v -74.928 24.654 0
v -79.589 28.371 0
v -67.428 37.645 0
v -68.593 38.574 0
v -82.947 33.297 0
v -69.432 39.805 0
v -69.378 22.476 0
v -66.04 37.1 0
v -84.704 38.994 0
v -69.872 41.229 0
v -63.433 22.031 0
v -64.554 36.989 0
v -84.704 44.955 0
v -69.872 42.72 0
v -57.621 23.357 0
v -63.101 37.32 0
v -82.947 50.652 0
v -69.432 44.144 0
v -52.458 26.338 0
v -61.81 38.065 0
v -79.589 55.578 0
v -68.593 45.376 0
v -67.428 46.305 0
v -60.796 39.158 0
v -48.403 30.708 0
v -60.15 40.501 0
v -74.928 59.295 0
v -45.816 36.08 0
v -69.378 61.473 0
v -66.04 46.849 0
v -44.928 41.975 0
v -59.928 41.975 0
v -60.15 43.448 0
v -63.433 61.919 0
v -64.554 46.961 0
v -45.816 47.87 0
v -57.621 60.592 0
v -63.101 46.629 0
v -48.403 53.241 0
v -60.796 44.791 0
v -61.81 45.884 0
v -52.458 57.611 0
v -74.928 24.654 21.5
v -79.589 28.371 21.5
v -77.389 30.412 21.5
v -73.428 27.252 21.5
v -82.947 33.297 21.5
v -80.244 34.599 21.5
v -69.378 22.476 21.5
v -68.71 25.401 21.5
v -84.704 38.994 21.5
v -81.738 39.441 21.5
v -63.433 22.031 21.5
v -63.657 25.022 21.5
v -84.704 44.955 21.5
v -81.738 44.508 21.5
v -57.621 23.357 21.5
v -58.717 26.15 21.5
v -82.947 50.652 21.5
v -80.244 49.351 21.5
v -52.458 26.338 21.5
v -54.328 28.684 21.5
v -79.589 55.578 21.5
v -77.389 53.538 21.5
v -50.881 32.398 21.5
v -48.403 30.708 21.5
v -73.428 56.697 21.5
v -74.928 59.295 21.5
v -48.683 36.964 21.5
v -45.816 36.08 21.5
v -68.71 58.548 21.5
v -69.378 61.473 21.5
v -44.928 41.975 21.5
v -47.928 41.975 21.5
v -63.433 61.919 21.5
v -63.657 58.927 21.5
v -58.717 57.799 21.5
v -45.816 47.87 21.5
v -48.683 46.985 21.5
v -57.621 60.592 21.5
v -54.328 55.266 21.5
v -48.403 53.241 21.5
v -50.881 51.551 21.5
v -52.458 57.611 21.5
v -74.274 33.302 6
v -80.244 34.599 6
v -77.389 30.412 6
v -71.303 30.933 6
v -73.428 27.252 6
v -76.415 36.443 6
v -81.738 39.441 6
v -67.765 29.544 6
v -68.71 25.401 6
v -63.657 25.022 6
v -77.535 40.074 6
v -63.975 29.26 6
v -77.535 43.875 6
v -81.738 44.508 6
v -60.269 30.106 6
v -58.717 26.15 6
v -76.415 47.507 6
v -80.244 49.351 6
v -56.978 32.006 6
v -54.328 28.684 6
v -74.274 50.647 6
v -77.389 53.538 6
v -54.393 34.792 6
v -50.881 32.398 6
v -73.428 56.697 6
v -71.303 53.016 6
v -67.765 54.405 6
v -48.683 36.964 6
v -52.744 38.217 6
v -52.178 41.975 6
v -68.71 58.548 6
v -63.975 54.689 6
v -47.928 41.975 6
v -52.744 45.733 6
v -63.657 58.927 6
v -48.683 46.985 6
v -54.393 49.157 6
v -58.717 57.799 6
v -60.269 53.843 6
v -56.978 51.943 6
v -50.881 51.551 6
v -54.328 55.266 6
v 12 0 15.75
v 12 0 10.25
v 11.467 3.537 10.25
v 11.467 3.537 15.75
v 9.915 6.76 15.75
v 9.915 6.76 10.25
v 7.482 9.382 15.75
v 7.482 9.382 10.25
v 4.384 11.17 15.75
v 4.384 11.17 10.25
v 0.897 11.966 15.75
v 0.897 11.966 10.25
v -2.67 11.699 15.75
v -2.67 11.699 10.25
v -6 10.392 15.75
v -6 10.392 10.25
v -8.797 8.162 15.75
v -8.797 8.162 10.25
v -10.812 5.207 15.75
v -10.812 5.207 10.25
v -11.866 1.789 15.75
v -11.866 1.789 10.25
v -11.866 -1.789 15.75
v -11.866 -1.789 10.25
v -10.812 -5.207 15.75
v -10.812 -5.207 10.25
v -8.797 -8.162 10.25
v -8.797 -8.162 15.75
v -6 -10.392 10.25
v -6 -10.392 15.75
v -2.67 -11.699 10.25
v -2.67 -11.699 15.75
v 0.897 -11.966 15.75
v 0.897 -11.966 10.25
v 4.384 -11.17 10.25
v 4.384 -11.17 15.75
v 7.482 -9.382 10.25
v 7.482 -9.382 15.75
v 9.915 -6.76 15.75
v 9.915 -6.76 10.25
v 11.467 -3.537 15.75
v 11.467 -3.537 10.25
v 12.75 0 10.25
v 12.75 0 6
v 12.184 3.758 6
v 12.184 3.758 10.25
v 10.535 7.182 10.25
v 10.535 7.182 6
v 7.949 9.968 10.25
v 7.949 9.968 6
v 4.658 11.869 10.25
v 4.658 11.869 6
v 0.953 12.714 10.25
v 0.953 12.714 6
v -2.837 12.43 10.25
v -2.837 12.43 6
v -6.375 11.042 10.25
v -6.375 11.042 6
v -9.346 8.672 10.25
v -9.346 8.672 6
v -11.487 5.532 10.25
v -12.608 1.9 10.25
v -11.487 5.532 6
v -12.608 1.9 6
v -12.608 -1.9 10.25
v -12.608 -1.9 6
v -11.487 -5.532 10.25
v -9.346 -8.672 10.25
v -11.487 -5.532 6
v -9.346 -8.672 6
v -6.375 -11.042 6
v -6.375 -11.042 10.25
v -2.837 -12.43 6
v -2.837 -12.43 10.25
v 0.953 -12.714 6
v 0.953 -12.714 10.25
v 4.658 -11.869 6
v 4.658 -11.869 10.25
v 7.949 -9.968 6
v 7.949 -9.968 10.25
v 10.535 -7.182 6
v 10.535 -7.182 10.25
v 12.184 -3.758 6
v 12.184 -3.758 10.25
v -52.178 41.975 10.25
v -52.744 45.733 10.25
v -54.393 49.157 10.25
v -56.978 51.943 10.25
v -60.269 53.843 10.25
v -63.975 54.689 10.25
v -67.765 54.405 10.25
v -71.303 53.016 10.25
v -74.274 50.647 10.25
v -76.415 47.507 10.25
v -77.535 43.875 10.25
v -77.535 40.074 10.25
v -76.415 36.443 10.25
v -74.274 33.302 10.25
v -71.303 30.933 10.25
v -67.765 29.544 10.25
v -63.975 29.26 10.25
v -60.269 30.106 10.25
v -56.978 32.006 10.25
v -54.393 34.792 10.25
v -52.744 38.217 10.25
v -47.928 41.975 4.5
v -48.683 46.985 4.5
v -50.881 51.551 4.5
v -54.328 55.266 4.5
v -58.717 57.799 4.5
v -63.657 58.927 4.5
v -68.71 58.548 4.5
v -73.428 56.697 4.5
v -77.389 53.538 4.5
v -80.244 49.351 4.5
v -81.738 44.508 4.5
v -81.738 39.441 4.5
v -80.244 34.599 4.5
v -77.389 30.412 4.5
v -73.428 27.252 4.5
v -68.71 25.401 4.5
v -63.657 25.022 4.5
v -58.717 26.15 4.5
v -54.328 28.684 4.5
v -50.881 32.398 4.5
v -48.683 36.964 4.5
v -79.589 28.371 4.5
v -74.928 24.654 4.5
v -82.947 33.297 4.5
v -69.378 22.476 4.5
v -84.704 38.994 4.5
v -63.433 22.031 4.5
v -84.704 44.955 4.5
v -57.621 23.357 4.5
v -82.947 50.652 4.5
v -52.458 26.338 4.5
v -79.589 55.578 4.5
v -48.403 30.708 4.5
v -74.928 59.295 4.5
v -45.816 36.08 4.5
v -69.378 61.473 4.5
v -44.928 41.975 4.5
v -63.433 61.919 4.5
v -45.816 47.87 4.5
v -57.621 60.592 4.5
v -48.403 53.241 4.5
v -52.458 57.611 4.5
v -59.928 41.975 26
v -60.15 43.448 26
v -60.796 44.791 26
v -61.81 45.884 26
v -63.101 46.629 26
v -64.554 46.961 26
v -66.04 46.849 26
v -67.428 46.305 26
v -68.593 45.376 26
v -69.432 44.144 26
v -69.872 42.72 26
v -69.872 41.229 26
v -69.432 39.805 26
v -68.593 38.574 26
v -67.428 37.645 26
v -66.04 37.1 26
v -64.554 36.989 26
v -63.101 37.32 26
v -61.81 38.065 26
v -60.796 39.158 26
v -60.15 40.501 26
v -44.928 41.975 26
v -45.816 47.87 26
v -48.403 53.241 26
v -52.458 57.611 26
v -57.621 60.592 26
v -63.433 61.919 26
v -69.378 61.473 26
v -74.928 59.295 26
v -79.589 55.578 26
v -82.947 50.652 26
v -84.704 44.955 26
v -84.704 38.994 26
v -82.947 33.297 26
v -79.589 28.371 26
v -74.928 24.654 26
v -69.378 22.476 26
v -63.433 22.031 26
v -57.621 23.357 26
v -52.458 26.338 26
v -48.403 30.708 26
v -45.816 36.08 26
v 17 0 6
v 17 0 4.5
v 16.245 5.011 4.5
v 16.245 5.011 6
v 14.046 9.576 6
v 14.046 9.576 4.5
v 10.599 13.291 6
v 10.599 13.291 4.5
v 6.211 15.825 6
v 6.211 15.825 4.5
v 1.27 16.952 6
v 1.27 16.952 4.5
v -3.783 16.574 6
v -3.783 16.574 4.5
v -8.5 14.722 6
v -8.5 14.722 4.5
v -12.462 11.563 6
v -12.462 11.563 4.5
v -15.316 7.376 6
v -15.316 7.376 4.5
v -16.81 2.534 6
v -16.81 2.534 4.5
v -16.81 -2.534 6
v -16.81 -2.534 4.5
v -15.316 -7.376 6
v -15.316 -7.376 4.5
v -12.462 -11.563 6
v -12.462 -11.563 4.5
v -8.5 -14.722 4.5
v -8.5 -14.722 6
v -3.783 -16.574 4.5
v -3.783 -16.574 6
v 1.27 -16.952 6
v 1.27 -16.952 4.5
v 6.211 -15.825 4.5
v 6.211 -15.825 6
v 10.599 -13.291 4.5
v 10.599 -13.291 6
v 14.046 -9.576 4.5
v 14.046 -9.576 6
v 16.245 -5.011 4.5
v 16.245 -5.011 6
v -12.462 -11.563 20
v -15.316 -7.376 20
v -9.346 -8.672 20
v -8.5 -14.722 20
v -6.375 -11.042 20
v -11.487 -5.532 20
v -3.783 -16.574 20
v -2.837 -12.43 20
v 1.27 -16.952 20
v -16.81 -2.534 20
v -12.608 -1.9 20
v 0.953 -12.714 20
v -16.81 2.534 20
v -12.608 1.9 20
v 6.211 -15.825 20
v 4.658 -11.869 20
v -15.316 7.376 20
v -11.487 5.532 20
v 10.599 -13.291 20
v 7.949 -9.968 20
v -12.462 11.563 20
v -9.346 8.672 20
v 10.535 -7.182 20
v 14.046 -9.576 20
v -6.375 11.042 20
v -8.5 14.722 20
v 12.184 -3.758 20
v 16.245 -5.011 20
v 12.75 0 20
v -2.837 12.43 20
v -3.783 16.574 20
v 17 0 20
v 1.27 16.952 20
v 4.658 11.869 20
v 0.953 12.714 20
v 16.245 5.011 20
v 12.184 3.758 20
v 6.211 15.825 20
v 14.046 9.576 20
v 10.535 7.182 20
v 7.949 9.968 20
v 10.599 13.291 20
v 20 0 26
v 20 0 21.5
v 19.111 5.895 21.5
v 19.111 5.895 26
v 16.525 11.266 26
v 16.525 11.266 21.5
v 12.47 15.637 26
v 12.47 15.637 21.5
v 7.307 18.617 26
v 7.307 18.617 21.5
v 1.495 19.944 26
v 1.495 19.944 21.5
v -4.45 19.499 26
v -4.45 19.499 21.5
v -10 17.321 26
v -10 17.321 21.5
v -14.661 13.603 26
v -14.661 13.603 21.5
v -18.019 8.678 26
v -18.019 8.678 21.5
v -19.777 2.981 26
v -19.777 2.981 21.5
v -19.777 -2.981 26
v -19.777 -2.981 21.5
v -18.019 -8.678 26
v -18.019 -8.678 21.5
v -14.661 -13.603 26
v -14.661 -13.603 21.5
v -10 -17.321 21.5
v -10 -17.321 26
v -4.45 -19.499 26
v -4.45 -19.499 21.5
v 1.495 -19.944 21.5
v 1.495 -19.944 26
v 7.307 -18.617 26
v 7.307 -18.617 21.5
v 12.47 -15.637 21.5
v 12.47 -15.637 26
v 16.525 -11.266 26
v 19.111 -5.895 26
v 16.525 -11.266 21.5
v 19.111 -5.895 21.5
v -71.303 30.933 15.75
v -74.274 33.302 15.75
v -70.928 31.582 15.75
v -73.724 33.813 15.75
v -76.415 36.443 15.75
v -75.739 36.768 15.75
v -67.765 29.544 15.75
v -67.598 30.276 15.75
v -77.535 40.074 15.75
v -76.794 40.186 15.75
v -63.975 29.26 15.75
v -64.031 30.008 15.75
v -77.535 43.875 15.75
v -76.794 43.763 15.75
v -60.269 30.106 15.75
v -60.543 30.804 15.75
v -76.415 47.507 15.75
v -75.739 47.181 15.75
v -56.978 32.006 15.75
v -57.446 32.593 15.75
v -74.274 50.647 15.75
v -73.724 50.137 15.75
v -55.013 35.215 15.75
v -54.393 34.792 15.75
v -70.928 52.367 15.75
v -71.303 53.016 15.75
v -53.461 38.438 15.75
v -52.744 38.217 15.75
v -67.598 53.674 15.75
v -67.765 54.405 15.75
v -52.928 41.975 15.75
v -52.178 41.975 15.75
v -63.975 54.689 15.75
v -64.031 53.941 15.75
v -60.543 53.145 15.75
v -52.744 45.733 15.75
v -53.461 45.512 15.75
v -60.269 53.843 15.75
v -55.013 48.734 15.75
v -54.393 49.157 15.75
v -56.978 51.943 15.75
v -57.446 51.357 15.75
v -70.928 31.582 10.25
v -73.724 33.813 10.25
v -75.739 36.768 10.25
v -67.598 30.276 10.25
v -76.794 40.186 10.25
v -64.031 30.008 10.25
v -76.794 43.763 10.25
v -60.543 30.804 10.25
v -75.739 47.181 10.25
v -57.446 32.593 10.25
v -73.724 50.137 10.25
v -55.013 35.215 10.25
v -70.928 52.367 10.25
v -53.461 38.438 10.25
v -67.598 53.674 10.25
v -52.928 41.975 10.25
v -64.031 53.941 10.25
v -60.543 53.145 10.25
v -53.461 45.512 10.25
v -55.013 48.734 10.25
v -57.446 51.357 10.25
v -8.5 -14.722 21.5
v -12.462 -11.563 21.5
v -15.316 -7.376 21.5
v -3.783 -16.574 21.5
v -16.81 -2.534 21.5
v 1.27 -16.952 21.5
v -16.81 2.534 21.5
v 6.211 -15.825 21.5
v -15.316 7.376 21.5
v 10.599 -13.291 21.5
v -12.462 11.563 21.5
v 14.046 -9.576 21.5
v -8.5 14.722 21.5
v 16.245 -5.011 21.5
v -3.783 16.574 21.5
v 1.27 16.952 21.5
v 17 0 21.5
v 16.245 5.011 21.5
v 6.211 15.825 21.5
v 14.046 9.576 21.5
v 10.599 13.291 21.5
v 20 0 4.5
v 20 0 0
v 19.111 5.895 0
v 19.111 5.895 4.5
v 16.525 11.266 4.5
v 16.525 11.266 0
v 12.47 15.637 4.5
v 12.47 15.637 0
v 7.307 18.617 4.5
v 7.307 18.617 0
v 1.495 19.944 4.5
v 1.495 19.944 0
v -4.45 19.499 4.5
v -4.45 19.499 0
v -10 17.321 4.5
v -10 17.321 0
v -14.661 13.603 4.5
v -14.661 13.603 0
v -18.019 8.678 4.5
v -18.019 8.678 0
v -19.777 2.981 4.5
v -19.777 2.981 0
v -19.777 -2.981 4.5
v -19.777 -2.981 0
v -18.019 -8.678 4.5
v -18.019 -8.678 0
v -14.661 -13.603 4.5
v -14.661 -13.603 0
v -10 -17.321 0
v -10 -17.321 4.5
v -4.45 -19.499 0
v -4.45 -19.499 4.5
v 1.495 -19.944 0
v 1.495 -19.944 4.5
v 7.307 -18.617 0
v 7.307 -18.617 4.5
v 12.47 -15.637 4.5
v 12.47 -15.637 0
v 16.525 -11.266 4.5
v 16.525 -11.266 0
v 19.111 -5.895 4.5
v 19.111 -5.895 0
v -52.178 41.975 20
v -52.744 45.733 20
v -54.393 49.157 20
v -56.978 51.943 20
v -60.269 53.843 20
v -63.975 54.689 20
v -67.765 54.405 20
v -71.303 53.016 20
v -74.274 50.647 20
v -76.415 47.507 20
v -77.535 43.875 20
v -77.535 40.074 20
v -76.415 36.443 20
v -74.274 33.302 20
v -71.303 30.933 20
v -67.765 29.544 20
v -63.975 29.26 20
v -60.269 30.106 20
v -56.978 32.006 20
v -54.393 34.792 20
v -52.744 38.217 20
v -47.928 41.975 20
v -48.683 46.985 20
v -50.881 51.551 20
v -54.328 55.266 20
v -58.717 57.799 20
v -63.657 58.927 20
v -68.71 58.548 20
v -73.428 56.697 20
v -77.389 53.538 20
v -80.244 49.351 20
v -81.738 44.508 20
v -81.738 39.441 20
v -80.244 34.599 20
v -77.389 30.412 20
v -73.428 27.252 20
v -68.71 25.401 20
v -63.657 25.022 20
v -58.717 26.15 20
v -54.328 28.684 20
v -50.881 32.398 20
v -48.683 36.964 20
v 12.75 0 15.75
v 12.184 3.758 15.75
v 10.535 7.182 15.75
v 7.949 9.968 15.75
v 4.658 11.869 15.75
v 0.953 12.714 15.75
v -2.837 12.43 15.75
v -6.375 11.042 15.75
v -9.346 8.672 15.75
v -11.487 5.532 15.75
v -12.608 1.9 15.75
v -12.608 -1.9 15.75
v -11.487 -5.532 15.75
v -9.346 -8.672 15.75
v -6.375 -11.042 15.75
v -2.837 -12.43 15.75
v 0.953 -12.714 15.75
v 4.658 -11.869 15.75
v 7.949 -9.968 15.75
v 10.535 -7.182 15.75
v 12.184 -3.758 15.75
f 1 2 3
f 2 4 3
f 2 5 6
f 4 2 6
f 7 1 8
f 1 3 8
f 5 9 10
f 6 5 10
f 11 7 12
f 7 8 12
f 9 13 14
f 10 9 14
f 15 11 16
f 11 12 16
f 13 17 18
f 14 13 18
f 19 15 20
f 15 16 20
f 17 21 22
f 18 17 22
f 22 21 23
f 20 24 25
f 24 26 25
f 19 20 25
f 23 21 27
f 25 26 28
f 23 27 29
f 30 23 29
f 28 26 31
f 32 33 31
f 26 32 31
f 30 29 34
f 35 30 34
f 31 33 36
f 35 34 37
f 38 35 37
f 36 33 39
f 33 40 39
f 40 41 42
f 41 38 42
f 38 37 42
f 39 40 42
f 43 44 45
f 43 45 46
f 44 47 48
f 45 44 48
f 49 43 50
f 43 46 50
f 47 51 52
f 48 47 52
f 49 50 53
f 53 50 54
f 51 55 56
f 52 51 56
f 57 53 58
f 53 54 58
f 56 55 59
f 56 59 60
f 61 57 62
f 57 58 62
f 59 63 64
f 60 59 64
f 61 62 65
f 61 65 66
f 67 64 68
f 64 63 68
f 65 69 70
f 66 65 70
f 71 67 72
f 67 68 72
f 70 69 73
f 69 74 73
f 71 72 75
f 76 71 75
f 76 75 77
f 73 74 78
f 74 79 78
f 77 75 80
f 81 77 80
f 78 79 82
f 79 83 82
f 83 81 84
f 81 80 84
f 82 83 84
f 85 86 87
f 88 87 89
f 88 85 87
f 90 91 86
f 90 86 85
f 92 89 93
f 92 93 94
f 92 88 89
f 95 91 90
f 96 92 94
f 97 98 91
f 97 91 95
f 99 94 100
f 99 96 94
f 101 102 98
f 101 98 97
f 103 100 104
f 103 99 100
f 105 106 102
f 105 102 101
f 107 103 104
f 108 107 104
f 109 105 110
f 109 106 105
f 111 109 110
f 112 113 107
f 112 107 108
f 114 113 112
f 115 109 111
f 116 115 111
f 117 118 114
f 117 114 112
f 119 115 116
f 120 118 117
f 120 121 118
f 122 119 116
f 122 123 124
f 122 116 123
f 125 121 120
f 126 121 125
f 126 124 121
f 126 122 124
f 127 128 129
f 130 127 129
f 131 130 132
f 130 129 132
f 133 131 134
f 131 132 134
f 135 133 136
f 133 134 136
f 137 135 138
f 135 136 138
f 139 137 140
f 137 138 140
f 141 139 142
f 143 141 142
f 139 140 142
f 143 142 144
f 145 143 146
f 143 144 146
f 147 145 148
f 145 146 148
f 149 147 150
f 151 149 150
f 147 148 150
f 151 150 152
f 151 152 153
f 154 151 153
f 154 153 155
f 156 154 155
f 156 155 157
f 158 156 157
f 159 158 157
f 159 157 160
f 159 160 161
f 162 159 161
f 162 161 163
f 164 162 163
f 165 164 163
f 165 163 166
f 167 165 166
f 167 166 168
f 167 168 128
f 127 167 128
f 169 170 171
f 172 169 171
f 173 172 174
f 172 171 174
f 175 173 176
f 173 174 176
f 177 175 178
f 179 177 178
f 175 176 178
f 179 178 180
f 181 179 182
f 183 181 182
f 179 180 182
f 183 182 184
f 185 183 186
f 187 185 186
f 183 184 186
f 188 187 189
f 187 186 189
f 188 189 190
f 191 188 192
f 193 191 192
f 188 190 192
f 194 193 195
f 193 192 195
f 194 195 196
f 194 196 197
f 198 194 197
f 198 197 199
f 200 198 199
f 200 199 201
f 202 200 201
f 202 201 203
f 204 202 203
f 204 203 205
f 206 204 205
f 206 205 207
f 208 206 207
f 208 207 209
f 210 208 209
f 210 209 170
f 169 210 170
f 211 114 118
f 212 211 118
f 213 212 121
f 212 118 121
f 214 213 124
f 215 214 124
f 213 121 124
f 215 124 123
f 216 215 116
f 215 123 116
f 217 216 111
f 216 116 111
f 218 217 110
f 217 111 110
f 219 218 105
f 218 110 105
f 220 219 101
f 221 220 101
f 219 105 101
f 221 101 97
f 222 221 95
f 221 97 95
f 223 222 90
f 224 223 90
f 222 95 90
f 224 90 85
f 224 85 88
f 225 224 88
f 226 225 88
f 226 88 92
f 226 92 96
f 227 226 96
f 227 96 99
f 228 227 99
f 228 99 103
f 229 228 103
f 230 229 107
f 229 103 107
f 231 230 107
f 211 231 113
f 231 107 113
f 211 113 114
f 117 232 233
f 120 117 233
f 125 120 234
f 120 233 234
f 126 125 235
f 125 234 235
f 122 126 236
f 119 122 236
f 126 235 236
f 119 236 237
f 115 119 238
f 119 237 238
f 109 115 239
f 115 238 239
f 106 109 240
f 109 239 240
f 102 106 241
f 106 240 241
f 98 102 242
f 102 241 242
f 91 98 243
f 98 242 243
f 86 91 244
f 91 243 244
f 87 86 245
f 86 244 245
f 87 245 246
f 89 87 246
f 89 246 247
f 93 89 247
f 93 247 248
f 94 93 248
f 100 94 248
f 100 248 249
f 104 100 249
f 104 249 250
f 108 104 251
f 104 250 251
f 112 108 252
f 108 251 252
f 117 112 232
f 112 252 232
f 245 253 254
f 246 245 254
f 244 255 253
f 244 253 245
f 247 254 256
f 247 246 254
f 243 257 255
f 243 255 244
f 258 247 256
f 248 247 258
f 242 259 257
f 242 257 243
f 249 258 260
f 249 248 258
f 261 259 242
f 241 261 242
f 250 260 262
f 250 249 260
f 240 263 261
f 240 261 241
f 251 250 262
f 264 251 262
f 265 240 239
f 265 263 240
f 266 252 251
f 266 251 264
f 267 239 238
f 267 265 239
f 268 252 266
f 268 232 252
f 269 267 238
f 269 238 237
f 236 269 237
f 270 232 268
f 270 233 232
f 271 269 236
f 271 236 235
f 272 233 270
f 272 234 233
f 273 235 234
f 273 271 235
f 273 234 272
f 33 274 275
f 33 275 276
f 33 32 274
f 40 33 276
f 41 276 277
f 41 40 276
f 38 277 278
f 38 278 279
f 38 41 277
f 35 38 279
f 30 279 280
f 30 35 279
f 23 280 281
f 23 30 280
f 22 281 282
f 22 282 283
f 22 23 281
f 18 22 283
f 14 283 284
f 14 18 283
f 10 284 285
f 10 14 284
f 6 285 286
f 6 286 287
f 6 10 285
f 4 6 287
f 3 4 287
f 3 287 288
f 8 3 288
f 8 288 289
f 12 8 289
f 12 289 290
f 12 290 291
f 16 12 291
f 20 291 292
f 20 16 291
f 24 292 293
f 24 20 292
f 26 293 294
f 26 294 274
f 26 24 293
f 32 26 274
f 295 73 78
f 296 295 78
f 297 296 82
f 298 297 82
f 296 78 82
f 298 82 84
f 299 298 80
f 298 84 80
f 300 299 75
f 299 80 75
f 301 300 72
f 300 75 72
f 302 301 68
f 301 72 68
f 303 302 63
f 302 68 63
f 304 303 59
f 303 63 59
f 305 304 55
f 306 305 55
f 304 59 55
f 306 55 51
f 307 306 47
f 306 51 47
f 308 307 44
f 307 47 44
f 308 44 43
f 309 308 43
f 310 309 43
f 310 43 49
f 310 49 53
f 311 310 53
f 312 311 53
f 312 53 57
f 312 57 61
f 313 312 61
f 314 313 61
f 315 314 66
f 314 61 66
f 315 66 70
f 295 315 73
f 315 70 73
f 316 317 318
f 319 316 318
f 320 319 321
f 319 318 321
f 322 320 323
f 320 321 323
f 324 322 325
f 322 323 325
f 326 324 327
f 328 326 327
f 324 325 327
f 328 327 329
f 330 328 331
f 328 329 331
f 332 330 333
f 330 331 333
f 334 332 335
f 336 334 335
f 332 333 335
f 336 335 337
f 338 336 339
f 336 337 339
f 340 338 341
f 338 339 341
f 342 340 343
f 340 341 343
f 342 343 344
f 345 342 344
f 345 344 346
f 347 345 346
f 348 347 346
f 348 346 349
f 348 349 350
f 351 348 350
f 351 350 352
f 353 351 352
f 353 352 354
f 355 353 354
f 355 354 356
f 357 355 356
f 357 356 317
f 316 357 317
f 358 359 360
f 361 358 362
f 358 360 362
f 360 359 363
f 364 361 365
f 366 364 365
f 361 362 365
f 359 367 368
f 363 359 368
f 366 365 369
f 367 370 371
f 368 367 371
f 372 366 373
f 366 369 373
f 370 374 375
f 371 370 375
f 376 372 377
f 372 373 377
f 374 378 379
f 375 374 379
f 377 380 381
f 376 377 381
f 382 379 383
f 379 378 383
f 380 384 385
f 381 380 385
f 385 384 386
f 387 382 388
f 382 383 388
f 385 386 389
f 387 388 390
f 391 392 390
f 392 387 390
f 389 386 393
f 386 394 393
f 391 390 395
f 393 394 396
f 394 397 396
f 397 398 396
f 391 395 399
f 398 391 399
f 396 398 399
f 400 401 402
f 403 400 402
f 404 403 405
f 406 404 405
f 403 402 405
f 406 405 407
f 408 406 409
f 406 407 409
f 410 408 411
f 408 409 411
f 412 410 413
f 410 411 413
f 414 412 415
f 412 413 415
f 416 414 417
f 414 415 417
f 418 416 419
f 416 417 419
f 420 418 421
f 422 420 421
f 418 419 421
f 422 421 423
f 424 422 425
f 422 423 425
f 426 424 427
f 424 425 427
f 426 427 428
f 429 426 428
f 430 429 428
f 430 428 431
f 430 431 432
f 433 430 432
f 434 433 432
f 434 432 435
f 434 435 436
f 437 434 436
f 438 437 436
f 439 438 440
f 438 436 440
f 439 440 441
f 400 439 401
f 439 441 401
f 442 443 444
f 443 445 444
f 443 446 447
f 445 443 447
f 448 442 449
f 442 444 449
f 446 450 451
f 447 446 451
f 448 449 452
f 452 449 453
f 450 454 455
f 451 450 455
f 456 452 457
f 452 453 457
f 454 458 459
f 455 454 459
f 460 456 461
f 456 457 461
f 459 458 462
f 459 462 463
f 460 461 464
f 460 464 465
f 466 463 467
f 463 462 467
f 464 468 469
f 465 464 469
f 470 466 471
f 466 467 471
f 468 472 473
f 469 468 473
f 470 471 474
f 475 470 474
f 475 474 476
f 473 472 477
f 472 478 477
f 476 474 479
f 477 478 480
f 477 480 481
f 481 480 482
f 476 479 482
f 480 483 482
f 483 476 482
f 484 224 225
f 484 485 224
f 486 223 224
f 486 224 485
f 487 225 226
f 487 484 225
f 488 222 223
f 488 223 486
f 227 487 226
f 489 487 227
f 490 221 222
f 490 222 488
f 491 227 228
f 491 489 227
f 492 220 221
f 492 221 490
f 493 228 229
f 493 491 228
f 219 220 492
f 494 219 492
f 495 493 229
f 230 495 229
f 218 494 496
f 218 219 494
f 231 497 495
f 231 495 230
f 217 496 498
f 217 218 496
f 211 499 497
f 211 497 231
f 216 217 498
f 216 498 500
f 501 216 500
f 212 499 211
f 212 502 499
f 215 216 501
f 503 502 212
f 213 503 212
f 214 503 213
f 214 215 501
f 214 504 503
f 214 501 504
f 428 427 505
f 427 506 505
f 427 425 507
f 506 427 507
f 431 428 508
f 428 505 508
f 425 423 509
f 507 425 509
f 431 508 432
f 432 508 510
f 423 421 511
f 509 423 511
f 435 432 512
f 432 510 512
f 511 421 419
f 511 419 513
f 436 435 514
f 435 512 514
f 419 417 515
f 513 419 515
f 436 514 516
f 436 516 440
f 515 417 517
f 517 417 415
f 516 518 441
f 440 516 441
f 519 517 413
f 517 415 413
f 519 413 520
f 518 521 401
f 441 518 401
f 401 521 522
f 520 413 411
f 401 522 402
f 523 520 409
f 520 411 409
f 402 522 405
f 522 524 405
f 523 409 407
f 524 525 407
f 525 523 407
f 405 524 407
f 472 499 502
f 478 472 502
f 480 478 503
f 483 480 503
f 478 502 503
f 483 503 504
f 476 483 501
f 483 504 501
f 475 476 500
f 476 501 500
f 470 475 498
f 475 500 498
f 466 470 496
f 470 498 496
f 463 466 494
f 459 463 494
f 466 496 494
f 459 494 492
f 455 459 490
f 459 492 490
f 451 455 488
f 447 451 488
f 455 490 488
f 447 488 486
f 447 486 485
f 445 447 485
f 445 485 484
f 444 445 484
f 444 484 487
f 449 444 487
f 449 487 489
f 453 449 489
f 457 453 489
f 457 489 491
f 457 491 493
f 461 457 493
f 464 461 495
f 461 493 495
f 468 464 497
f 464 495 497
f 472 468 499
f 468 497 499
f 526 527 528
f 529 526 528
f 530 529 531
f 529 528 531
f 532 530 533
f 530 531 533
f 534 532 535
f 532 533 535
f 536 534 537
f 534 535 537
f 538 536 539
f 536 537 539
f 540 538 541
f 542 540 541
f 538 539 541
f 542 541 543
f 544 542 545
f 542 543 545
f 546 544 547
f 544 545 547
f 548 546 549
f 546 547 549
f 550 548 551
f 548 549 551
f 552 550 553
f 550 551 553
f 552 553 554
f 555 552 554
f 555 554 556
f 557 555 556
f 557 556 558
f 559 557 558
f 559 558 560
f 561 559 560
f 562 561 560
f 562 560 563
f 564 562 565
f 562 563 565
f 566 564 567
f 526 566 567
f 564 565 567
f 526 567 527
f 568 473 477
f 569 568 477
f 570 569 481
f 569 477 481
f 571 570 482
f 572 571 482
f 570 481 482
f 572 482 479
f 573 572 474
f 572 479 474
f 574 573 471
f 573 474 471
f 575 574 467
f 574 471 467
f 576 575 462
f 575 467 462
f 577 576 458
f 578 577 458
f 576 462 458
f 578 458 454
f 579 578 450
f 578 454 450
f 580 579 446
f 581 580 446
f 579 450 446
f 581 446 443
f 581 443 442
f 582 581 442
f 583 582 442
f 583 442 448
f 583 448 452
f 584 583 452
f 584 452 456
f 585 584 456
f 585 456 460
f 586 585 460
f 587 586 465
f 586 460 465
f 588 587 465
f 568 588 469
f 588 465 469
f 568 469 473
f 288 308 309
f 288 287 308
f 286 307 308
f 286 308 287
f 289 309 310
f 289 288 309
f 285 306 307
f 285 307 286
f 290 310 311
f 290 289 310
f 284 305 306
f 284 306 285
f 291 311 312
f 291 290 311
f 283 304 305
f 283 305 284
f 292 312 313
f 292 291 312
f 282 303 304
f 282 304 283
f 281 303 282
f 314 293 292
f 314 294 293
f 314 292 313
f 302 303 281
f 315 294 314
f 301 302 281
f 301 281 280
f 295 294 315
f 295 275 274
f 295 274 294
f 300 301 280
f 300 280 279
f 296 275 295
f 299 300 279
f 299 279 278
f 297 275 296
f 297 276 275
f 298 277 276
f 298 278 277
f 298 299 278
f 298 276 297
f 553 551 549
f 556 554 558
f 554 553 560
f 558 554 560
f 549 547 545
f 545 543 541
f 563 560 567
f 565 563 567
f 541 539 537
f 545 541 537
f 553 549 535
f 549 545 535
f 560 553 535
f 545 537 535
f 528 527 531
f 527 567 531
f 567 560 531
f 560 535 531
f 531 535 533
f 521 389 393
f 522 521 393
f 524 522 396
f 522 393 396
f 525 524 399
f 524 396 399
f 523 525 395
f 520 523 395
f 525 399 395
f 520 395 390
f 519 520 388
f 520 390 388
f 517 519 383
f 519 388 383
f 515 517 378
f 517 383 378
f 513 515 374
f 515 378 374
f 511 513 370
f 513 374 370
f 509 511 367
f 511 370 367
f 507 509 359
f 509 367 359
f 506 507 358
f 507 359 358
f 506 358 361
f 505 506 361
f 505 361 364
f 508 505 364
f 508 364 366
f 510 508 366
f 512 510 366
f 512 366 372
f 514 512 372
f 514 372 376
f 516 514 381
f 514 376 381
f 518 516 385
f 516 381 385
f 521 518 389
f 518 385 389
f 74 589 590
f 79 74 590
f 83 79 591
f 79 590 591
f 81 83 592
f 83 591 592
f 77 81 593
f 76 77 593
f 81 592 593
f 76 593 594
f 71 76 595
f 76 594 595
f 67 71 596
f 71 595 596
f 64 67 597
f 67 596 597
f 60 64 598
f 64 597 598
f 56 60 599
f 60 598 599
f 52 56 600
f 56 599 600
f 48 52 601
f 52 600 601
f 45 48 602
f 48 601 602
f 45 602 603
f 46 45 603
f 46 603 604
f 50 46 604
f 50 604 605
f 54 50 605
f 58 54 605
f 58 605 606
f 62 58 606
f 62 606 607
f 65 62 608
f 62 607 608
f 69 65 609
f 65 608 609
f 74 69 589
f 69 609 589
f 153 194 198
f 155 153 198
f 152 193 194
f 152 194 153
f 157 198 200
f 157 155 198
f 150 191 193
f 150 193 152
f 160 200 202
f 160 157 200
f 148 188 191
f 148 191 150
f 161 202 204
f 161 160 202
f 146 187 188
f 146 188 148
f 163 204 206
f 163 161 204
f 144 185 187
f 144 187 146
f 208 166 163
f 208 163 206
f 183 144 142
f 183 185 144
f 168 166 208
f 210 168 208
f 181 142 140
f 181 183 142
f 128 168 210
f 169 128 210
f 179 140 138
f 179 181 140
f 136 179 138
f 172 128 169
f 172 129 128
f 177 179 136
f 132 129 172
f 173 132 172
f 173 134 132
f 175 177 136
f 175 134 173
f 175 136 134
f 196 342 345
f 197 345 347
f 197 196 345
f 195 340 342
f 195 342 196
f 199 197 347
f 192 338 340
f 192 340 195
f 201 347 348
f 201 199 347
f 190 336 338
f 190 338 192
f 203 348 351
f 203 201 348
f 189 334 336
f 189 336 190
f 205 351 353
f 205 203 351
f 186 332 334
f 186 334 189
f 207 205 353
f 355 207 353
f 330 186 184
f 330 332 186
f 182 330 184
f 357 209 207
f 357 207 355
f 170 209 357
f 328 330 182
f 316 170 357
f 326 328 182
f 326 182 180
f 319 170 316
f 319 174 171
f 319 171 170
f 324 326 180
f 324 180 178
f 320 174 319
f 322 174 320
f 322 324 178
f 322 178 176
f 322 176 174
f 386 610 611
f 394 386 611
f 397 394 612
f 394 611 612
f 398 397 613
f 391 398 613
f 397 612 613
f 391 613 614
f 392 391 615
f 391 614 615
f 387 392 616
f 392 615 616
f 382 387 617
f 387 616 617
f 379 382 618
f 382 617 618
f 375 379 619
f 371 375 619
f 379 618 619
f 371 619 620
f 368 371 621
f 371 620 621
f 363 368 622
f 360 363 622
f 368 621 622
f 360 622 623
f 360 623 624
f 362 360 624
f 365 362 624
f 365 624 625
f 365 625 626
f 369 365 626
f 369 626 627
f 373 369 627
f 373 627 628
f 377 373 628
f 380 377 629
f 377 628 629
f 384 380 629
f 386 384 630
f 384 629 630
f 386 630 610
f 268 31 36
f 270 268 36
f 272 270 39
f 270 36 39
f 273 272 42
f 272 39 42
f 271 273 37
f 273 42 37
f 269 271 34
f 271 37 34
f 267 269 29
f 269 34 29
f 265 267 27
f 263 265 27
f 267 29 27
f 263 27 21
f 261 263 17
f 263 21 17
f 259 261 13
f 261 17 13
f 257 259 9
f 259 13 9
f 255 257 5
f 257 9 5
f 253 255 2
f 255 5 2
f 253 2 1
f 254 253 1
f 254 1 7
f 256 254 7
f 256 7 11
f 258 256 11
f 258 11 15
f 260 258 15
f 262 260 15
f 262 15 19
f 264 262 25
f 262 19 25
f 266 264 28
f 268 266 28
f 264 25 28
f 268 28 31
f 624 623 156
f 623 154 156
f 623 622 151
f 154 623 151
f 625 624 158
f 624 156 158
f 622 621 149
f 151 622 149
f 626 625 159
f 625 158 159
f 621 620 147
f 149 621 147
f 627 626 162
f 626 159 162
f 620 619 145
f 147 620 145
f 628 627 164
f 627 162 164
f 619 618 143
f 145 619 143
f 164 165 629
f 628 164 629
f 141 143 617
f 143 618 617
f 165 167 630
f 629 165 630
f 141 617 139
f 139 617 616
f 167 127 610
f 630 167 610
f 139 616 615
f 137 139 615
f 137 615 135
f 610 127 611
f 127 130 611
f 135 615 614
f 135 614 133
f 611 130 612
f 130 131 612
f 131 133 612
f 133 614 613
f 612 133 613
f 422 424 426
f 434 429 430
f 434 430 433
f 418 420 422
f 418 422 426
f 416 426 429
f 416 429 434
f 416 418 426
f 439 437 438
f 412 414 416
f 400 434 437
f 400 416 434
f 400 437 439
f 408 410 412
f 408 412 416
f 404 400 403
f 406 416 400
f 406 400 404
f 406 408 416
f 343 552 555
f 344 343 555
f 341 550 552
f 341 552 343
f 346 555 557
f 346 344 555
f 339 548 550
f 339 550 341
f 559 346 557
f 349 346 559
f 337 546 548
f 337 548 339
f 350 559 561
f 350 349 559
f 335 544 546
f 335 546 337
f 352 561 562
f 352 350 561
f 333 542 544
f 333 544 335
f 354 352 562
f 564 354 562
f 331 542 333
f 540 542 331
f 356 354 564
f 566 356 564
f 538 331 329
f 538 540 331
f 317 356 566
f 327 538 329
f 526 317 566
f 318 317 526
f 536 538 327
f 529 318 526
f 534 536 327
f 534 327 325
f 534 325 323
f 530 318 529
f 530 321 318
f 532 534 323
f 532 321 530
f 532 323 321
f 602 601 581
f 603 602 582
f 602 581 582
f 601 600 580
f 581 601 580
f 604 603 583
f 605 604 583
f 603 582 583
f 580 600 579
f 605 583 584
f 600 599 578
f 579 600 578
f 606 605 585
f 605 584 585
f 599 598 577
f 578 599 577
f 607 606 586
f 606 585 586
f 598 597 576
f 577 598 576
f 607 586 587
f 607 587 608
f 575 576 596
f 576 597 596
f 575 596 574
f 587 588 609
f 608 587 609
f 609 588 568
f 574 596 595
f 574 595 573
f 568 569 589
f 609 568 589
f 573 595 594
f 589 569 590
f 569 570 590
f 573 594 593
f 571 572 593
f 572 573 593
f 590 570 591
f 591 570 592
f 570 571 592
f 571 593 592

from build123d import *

# Parameters (mm, degrees)
F0_R      = 20
F1_DEPTH  = 4.5
F2_R      = 17
F3_DEPTH  = 6
F4_R      = 12.75
F5_DEPTH  = 10.25
F6_R      = 12
F7_DEPTH  = 15.75
F8_R      = 12.75
F9_DEPTH  = 4.25
F10_R     = 17
F11_DEPTH = 1.5
F12_R     = 20
F13_DEPTH = 4.5
F14_R     = 20
F14_R_2   = 5
F15_DEPTH = 4.5
F16_R     = 17
F16_R_2   = 5
F17_DEPTH = 1.5
F18_R     = 12.75
F18_R_2   = 5
F19_DEPTH = 4.25
F20_R     = 12
F20_R_2   = 5
F21_DEPTH = 5.5
F22_R     = 12.75
F22_R_2   = 5
F23_DEPTH = 4.25
F24_R     = 17
F24_R_2   = 5
F25_DEPTH = 1.5
F26_R     = 20
F26_R_2   = 5
F27_DEPTH = 4.5


with BuildPart() as f1:
    # F0 (on Top) → F1 (new body)
    with BuildSketch(Plane.XY):
        Circle(F0_R)
    extrude(amount=F1_DEPTH)

    # F2 (on Top) → F3 (join)
    with BuildSketch(Plane.XY):
        Circle(F2_R)
    extrude(amount=F3_DEPTH)

    # F4 (on Top) → F5 (join)
    with BuildSketch(Plane.XY):
        Circle(F4_R)
    extrude(amount=F5_DEPTH)

    # F6 (on Top) → F7 (join)
    with BuildSketch(Plane.XY):
        Circle(F6_R)
    extrude(amount=F7_DEPTH)

    # F8 (on face) → F9 (join)
    with BuildSketch(Plane.XY.offset(15.75)):
        Circle(F8_R)
    extrude(amount=F9_DEPTH)

    # F10 (on face) → F11 (join)
    with BuildSketch(Plane.XY.offset(20)):
        Circle(F10_R)
    extrude(amount=F11_DEPTH)

    # F12 (on face) → F13 (join)
    with BuildSketch(Plane.XY.offset(21.5)):
        Circle(F12_R)
    extrude(amount=F13_DEPTH)


with BuildPart() as f15:
    # F14 (on Top) → F15 (new body)
    with BuildSketch(Plane.XY):
        with Locations((-64.9275407195, 41.9746376574)):
            Circle(F14_R)
        with Locations((-64.9275407195, 41.9746376574)):
            Circle(F14_R_2, mode=Mode.SUBTRACT)
    extrude(amount=F15_DEPTH)

    # F16 (on face) → F17 (join)
    with BuildSketch(Plane.XY.offset(4.5)):
        with Locations((-64.9275407195, 41.9746376574)):
            Circle(F16_R)
        with Locations((-64.9275407195, 41.9746376574)):
            Circle(F16_R_2, mode=Mode.SUBTRACT)
    extrude(amount=F17_DEPTH)

    # F18 (on face) → F19 (join)
    with BuildSketch(Plane.XY.offset(6)):
        with Locations((-64.9275407195, 41.9746376574)):
            Circle(F18_R)
        with Locations((-64.9275407195, 41.9746376574)):
            Circle(F18_R_2, mode=Mode.SUBTRACT)
    extrude(amount=F19_DEPTH)

    # F20 (on face) → F21 (join)
    with BuildSketch(Plane.XY.offset(10.25)):
        with Locations((-64.9275407195, 41.9746376574)):
            Circle(F20_R)
        with Locations((-64.9275407195, 41.9746376574)):
            Circle(F20_R_2, mode=Mode.SUBTRACT)
    extrude(amount=F21_DEPTH)

    # F22 (on face) → F23 (join)
    with BuildSketch(Plane.XY.offset(15.75)):
        with Locations((-64.9275407195, 41.9746376574)):
            Circle(F22_R)
        with Locations((-64.9275407195, 41.9746376574)):
            Circle(F22_R_2, mode=Mode.SUBTRACT)
    extrude(amount=F23_DEPTH)

    # F24 (on face) → F25 (join)
    with BuildSketch(Plane.XY.offset(20)):
        with Locations((-64.9275407195, 41.9746376574)):
            Circle(F24_R)
        with Locations((-64.9275407195, 41.9746376574)):
            Circle(F24_R_2, mode=Mode.SUBTRACT)
    extrude(amount=F25_DEPTH)

    # F26 (on face) → F27 (join)
    with BuildSketch(Plane.XY.offset(21.5)):
        with Locations((-64.9275407195, 41.9746376574)):
            Circle(F26_R)
        with Locations((-64.9275407195, 41.9746376574)):
            Circle(F26_R_2, mode=Mode.SUBTRACT)
    extrude(amount=F27_DEPTH)


solid = Compound([f1.part, f15.part])
